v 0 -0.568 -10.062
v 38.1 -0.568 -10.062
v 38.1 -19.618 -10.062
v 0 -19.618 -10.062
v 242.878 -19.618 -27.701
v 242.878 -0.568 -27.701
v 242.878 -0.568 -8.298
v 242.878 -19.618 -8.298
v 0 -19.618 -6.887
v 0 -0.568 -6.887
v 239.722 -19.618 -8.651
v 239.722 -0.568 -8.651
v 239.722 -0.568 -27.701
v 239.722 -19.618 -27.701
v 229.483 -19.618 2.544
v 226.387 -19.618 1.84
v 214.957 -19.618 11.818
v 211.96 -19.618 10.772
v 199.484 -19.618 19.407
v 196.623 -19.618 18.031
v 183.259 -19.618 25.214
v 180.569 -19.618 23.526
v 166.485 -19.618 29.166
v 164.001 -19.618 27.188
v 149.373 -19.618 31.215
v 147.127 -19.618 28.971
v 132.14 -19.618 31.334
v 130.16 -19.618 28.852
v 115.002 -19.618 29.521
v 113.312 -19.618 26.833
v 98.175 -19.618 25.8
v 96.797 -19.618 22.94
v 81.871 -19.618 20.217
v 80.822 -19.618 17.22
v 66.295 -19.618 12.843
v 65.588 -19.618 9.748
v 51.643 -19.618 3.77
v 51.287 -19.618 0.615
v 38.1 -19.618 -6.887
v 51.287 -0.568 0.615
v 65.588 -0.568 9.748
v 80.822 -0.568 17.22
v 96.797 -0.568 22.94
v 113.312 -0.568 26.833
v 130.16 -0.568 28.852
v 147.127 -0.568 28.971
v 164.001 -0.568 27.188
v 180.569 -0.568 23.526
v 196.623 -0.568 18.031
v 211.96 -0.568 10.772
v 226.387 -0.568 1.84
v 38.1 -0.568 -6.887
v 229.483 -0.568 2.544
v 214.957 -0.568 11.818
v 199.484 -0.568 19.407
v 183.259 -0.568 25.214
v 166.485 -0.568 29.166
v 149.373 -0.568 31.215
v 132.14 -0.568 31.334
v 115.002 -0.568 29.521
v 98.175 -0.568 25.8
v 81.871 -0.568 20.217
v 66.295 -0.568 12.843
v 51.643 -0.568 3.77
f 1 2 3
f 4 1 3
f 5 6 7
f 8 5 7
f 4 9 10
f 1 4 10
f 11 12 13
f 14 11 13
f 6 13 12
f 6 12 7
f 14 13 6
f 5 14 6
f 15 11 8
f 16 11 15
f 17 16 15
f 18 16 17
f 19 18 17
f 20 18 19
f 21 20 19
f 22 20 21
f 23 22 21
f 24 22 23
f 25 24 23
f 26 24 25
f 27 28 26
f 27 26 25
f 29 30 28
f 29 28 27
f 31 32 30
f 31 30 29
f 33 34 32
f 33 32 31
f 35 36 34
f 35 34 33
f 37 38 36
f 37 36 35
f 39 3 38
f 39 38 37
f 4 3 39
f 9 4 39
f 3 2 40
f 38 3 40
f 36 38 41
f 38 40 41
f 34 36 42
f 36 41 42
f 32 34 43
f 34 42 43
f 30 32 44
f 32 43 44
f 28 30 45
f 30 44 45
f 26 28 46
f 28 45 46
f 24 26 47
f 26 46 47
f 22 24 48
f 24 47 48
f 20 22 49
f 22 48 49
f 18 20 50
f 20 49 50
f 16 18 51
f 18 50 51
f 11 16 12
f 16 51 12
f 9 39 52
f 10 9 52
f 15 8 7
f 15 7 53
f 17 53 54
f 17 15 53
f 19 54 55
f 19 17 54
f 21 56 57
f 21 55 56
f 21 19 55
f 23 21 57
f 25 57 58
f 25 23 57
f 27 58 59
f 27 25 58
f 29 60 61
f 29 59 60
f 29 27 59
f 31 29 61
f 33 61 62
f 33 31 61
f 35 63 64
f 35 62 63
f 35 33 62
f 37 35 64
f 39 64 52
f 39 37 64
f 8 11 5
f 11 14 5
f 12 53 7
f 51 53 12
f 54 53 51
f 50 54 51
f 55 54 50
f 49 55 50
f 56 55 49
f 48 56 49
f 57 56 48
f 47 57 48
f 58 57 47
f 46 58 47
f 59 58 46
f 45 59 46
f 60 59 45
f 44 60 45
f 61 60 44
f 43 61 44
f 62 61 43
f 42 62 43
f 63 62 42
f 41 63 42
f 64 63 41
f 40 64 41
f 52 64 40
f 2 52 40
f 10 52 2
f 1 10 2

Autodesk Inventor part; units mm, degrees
ref_plane "YZ Plane" through (0, 0, 0) normal (1, 0, 0) x (0, 1, 0)
ref_plane "XZ Plane" through (0, 0, 0) normal (0, 1, 0) x (-1, 0, 0)
ref_plane "XY Plane" through (0, 0, 0) normal (0, 0, 1) x (1, 0, 0)
sketch "Sketch1" plane through (0, 0, 0) normal (1, 0, 0) x (0, 1, 0)
  line L0 (-19.6181, -6.8872) -> (-0.5681, -6.8872)
  line L1 (-0.5681, -6.8872) -> (-0.5681, -10.0622)
  line L2 (-0.5681, -10.0622) -> (-19.6181, -10.0622)
  line L3 (-19.6181, -10.0622) -> (-19.6181, -6.8872)
  dimension "d7" = 19.05
  dimension "d8" = 3.175
extrude "Extrusion1" add sketch "Sketch1" along normal blind 38.1
sketch "Sketch2" plane through (0, -0.5681, -6.8872) normal (0, 1, 0) x (1, 0, 0)
  line L0 (38.1, 3.175) -> (38.1, 0) projected
  arc A0 (38.1, 1.5875) -> (241.3, 1.5875) centre (139.7, 115.1798) ccw
  line L1 (0, 0) -> (38.1, 0) projected
  point P0 (0, -6.8872)
  dimension "d11" = 203.2
  dimension "d12" = 152.4
  dimension "d17" = 1.5875
sketch "Sketch3" plane through (38.1, 0, 0) normal (1, 0, 0) x (0, 0, -1)
  line L0 (6.8872, -0.5681) -> (6.8872, -19.6181) projected
  line L1 (6.8872, -19.6181) -> (10.0622, -19.6181) projected
  line L2 (10.0622, -19.6181) -> (10.0622, -0.5681) projected
  line L3 (10.0622, -0.5681) -> (6.8872, -0.5681) projected
  point P0 (0, 0)
sweep "Sweep1" add profiles "Sketch3" path "Sketch2" path curves A0
sketch "Sketch4" plane through (0, -0.5681, -6.8872) normal (0, 1, 0) x (1, 0, 0)
  line L0 (239.7223, 1.7639) -> (242.8777, 1.4111) projected
  line L1 (0, 3.175) -> (38.1, 3.175) projected
  line L2 (239.7223, 1.7639) -> (239.7223, 20.8139)
  line L3 (239.7223, 20.8139) -> (242.8777, 20.8139)
  line L4 (242.8777, 20.8139) -> (242.8777, 1.4111)
  point P0 (0, -6.8872)
  dimension "d14" = 19.05
extrude "Extrusion2" add sketch "Sketch4" against normal blind 19.05
properties part number "RearSkidSteel"
